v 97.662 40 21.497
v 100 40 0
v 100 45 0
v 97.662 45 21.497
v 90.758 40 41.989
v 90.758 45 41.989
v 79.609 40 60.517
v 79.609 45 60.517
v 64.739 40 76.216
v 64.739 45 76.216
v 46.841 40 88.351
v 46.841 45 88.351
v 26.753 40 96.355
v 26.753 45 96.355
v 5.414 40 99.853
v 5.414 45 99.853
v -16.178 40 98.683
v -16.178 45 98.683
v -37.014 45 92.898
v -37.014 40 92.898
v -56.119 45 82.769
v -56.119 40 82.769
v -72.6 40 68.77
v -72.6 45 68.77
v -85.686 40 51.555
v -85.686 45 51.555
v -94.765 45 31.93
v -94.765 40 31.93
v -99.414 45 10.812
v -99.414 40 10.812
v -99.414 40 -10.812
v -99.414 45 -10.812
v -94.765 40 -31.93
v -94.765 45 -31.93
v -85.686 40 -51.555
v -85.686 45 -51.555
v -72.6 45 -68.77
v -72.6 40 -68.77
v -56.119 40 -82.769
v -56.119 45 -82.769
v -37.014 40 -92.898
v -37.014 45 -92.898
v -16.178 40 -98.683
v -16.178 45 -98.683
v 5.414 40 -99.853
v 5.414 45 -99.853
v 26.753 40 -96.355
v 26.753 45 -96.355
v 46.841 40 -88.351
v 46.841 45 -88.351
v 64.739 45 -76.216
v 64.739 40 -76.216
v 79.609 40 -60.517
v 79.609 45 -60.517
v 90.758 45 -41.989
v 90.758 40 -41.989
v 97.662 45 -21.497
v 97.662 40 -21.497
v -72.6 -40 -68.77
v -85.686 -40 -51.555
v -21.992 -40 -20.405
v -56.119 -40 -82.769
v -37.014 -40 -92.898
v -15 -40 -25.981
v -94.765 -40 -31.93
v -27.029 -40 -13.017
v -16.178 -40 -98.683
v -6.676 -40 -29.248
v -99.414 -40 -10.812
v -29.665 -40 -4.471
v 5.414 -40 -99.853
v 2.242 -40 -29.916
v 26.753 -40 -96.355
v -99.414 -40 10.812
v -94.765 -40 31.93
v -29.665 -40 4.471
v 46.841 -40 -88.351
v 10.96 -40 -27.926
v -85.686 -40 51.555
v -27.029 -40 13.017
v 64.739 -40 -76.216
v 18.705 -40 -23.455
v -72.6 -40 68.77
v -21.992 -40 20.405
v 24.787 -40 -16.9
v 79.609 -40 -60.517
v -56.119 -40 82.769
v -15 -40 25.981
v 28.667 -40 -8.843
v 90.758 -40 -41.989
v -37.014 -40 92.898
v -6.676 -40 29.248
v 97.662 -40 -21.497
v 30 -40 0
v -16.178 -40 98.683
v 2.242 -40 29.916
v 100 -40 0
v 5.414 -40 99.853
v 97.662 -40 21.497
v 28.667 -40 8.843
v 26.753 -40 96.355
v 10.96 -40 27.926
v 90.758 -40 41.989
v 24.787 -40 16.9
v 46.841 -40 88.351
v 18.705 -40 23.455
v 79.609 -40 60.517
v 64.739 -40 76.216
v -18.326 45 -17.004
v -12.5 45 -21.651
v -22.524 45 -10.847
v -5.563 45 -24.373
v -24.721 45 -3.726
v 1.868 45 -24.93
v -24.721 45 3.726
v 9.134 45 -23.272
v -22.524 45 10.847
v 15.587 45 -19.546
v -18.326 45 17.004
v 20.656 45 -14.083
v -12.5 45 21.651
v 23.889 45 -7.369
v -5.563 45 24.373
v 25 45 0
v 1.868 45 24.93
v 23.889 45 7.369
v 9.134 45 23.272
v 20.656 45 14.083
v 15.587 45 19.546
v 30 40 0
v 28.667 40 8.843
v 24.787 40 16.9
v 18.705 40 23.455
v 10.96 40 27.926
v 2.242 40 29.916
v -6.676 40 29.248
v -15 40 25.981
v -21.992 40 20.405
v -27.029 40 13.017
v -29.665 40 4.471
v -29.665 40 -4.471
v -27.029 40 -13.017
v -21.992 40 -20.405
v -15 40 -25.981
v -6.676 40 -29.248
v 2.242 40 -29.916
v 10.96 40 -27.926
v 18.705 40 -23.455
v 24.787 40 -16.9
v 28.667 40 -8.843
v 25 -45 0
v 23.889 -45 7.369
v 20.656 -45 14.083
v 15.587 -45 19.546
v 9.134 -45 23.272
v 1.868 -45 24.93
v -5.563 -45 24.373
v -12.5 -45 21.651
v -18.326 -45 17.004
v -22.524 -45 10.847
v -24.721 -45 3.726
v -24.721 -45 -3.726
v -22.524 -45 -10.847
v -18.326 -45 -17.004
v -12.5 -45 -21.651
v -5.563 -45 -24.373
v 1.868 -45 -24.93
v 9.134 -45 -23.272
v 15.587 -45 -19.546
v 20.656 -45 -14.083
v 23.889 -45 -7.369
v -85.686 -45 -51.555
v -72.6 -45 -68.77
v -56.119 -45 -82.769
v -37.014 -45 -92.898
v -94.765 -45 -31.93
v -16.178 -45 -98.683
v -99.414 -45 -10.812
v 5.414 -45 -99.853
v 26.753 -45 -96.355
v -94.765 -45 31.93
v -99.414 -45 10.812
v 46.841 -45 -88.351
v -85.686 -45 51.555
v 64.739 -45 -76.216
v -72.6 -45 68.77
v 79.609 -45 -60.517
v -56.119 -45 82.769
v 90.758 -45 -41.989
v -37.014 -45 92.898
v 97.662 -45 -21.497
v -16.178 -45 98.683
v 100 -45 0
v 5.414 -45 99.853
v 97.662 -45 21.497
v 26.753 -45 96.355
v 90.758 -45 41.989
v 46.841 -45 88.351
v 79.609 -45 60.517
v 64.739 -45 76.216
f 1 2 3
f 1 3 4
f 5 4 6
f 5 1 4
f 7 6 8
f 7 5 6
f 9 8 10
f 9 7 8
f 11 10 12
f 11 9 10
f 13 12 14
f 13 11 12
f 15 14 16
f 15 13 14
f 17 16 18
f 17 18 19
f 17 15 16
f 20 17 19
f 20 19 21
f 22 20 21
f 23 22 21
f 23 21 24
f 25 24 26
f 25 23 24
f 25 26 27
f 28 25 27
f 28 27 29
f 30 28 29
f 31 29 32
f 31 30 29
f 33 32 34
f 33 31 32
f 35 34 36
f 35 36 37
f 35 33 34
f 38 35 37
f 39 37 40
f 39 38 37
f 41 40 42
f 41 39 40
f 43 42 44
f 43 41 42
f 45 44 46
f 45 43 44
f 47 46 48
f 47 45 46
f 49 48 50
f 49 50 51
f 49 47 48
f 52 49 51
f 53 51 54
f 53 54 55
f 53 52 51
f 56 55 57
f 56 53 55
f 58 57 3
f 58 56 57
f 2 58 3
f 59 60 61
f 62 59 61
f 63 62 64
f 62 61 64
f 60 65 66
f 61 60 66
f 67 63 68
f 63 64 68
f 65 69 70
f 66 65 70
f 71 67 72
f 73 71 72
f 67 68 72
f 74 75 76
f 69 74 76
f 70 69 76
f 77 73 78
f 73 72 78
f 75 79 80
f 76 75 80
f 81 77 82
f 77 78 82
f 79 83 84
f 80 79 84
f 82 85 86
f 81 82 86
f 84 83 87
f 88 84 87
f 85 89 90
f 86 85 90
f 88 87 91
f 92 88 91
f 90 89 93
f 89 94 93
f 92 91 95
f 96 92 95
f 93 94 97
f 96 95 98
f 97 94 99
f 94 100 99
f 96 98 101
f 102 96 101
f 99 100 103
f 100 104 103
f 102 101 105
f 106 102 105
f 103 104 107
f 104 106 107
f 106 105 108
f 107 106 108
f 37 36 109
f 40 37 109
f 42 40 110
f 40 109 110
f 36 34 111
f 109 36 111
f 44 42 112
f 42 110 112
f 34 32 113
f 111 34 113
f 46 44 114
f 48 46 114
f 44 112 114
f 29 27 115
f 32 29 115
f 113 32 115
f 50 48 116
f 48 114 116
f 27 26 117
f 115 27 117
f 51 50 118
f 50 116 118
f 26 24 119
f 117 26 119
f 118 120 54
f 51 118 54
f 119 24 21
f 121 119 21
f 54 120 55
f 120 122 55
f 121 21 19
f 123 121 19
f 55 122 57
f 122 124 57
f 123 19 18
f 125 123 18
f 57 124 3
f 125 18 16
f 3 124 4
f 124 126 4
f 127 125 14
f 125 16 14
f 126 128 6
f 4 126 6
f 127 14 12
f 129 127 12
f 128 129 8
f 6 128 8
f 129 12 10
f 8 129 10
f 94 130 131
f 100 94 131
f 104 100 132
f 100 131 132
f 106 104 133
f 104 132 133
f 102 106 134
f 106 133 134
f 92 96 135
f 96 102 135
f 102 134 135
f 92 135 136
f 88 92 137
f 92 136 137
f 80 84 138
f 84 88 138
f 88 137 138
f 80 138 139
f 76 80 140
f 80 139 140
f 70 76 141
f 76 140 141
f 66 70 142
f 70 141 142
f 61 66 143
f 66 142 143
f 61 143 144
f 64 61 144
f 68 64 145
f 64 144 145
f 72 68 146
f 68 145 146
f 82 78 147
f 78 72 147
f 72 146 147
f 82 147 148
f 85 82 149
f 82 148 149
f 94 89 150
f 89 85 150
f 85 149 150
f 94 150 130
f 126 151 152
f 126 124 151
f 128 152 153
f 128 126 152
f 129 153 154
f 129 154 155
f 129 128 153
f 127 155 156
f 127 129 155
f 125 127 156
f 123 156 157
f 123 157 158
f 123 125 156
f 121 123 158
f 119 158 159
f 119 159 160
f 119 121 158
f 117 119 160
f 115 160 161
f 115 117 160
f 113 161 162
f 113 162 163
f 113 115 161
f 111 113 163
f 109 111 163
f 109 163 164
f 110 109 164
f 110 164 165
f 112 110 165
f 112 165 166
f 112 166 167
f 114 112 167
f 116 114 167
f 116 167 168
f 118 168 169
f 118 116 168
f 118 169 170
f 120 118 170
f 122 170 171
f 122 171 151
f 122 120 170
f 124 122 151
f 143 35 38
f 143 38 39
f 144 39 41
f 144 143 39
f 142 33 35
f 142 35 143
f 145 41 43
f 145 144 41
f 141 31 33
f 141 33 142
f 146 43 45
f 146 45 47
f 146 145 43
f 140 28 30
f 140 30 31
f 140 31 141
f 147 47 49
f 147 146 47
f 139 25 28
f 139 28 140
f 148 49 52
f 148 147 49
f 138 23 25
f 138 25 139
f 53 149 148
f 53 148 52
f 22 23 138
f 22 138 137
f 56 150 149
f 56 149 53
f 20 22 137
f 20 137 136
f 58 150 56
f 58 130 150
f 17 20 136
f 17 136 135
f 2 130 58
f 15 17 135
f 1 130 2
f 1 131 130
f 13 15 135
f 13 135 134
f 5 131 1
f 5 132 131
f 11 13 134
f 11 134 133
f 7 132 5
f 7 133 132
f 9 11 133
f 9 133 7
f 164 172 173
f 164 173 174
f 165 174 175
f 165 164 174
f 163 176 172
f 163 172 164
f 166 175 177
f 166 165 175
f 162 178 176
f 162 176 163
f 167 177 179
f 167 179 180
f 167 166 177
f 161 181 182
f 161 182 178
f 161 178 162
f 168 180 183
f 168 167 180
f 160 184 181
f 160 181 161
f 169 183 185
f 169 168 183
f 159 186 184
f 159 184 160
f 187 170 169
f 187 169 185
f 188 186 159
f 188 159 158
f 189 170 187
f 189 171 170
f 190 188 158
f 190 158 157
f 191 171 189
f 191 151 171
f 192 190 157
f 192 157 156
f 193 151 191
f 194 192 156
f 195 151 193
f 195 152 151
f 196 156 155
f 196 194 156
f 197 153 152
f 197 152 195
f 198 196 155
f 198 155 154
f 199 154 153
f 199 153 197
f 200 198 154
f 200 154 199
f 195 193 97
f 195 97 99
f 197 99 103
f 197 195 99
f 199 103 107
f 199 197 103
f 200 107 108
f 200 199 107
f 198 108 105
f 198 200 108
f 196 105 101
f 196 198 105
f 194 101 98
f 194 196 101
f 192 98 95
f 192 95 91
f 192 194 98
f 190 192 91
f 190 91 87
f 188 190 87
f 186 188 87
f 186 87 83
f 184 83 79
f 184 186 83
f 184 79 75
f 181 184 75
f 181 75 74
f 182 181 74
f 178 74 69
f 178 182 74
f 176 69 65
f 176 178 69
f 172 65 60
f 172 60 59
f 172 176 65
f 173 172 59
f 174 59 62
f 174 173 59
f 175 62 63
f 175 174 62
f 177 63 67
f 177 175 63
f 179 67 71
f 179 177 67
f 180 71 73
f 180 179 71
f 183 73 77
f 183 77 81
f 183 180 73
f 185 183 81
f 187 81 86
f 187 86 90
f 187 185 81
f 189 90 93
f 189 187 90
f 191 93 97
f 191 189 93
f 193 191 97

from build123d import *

# Parameters (mm, degrees)
F0_R     = 100
F0_R_2   = 25
F1_DEPTH = 45
F2_T     = -5


with BuildPart() as f1:
    # F0 (on Front) → F1 (new body, symmetric)
    with BuildSketch(Plane.XZ):
        Circle(F0_R)
        Circle(F0_R_2, mode=Mode.SUBTRACT)
    extrude(amount=F1_DEPTH, both=True)

    # F2
    f2_openings = [f1.faces().sort_by_distance(p)[0] for p in [
        (-100, 0, 0),
    ]]
    offset(amount=F2_T, openings=f2_openings)


solid = f1.part
